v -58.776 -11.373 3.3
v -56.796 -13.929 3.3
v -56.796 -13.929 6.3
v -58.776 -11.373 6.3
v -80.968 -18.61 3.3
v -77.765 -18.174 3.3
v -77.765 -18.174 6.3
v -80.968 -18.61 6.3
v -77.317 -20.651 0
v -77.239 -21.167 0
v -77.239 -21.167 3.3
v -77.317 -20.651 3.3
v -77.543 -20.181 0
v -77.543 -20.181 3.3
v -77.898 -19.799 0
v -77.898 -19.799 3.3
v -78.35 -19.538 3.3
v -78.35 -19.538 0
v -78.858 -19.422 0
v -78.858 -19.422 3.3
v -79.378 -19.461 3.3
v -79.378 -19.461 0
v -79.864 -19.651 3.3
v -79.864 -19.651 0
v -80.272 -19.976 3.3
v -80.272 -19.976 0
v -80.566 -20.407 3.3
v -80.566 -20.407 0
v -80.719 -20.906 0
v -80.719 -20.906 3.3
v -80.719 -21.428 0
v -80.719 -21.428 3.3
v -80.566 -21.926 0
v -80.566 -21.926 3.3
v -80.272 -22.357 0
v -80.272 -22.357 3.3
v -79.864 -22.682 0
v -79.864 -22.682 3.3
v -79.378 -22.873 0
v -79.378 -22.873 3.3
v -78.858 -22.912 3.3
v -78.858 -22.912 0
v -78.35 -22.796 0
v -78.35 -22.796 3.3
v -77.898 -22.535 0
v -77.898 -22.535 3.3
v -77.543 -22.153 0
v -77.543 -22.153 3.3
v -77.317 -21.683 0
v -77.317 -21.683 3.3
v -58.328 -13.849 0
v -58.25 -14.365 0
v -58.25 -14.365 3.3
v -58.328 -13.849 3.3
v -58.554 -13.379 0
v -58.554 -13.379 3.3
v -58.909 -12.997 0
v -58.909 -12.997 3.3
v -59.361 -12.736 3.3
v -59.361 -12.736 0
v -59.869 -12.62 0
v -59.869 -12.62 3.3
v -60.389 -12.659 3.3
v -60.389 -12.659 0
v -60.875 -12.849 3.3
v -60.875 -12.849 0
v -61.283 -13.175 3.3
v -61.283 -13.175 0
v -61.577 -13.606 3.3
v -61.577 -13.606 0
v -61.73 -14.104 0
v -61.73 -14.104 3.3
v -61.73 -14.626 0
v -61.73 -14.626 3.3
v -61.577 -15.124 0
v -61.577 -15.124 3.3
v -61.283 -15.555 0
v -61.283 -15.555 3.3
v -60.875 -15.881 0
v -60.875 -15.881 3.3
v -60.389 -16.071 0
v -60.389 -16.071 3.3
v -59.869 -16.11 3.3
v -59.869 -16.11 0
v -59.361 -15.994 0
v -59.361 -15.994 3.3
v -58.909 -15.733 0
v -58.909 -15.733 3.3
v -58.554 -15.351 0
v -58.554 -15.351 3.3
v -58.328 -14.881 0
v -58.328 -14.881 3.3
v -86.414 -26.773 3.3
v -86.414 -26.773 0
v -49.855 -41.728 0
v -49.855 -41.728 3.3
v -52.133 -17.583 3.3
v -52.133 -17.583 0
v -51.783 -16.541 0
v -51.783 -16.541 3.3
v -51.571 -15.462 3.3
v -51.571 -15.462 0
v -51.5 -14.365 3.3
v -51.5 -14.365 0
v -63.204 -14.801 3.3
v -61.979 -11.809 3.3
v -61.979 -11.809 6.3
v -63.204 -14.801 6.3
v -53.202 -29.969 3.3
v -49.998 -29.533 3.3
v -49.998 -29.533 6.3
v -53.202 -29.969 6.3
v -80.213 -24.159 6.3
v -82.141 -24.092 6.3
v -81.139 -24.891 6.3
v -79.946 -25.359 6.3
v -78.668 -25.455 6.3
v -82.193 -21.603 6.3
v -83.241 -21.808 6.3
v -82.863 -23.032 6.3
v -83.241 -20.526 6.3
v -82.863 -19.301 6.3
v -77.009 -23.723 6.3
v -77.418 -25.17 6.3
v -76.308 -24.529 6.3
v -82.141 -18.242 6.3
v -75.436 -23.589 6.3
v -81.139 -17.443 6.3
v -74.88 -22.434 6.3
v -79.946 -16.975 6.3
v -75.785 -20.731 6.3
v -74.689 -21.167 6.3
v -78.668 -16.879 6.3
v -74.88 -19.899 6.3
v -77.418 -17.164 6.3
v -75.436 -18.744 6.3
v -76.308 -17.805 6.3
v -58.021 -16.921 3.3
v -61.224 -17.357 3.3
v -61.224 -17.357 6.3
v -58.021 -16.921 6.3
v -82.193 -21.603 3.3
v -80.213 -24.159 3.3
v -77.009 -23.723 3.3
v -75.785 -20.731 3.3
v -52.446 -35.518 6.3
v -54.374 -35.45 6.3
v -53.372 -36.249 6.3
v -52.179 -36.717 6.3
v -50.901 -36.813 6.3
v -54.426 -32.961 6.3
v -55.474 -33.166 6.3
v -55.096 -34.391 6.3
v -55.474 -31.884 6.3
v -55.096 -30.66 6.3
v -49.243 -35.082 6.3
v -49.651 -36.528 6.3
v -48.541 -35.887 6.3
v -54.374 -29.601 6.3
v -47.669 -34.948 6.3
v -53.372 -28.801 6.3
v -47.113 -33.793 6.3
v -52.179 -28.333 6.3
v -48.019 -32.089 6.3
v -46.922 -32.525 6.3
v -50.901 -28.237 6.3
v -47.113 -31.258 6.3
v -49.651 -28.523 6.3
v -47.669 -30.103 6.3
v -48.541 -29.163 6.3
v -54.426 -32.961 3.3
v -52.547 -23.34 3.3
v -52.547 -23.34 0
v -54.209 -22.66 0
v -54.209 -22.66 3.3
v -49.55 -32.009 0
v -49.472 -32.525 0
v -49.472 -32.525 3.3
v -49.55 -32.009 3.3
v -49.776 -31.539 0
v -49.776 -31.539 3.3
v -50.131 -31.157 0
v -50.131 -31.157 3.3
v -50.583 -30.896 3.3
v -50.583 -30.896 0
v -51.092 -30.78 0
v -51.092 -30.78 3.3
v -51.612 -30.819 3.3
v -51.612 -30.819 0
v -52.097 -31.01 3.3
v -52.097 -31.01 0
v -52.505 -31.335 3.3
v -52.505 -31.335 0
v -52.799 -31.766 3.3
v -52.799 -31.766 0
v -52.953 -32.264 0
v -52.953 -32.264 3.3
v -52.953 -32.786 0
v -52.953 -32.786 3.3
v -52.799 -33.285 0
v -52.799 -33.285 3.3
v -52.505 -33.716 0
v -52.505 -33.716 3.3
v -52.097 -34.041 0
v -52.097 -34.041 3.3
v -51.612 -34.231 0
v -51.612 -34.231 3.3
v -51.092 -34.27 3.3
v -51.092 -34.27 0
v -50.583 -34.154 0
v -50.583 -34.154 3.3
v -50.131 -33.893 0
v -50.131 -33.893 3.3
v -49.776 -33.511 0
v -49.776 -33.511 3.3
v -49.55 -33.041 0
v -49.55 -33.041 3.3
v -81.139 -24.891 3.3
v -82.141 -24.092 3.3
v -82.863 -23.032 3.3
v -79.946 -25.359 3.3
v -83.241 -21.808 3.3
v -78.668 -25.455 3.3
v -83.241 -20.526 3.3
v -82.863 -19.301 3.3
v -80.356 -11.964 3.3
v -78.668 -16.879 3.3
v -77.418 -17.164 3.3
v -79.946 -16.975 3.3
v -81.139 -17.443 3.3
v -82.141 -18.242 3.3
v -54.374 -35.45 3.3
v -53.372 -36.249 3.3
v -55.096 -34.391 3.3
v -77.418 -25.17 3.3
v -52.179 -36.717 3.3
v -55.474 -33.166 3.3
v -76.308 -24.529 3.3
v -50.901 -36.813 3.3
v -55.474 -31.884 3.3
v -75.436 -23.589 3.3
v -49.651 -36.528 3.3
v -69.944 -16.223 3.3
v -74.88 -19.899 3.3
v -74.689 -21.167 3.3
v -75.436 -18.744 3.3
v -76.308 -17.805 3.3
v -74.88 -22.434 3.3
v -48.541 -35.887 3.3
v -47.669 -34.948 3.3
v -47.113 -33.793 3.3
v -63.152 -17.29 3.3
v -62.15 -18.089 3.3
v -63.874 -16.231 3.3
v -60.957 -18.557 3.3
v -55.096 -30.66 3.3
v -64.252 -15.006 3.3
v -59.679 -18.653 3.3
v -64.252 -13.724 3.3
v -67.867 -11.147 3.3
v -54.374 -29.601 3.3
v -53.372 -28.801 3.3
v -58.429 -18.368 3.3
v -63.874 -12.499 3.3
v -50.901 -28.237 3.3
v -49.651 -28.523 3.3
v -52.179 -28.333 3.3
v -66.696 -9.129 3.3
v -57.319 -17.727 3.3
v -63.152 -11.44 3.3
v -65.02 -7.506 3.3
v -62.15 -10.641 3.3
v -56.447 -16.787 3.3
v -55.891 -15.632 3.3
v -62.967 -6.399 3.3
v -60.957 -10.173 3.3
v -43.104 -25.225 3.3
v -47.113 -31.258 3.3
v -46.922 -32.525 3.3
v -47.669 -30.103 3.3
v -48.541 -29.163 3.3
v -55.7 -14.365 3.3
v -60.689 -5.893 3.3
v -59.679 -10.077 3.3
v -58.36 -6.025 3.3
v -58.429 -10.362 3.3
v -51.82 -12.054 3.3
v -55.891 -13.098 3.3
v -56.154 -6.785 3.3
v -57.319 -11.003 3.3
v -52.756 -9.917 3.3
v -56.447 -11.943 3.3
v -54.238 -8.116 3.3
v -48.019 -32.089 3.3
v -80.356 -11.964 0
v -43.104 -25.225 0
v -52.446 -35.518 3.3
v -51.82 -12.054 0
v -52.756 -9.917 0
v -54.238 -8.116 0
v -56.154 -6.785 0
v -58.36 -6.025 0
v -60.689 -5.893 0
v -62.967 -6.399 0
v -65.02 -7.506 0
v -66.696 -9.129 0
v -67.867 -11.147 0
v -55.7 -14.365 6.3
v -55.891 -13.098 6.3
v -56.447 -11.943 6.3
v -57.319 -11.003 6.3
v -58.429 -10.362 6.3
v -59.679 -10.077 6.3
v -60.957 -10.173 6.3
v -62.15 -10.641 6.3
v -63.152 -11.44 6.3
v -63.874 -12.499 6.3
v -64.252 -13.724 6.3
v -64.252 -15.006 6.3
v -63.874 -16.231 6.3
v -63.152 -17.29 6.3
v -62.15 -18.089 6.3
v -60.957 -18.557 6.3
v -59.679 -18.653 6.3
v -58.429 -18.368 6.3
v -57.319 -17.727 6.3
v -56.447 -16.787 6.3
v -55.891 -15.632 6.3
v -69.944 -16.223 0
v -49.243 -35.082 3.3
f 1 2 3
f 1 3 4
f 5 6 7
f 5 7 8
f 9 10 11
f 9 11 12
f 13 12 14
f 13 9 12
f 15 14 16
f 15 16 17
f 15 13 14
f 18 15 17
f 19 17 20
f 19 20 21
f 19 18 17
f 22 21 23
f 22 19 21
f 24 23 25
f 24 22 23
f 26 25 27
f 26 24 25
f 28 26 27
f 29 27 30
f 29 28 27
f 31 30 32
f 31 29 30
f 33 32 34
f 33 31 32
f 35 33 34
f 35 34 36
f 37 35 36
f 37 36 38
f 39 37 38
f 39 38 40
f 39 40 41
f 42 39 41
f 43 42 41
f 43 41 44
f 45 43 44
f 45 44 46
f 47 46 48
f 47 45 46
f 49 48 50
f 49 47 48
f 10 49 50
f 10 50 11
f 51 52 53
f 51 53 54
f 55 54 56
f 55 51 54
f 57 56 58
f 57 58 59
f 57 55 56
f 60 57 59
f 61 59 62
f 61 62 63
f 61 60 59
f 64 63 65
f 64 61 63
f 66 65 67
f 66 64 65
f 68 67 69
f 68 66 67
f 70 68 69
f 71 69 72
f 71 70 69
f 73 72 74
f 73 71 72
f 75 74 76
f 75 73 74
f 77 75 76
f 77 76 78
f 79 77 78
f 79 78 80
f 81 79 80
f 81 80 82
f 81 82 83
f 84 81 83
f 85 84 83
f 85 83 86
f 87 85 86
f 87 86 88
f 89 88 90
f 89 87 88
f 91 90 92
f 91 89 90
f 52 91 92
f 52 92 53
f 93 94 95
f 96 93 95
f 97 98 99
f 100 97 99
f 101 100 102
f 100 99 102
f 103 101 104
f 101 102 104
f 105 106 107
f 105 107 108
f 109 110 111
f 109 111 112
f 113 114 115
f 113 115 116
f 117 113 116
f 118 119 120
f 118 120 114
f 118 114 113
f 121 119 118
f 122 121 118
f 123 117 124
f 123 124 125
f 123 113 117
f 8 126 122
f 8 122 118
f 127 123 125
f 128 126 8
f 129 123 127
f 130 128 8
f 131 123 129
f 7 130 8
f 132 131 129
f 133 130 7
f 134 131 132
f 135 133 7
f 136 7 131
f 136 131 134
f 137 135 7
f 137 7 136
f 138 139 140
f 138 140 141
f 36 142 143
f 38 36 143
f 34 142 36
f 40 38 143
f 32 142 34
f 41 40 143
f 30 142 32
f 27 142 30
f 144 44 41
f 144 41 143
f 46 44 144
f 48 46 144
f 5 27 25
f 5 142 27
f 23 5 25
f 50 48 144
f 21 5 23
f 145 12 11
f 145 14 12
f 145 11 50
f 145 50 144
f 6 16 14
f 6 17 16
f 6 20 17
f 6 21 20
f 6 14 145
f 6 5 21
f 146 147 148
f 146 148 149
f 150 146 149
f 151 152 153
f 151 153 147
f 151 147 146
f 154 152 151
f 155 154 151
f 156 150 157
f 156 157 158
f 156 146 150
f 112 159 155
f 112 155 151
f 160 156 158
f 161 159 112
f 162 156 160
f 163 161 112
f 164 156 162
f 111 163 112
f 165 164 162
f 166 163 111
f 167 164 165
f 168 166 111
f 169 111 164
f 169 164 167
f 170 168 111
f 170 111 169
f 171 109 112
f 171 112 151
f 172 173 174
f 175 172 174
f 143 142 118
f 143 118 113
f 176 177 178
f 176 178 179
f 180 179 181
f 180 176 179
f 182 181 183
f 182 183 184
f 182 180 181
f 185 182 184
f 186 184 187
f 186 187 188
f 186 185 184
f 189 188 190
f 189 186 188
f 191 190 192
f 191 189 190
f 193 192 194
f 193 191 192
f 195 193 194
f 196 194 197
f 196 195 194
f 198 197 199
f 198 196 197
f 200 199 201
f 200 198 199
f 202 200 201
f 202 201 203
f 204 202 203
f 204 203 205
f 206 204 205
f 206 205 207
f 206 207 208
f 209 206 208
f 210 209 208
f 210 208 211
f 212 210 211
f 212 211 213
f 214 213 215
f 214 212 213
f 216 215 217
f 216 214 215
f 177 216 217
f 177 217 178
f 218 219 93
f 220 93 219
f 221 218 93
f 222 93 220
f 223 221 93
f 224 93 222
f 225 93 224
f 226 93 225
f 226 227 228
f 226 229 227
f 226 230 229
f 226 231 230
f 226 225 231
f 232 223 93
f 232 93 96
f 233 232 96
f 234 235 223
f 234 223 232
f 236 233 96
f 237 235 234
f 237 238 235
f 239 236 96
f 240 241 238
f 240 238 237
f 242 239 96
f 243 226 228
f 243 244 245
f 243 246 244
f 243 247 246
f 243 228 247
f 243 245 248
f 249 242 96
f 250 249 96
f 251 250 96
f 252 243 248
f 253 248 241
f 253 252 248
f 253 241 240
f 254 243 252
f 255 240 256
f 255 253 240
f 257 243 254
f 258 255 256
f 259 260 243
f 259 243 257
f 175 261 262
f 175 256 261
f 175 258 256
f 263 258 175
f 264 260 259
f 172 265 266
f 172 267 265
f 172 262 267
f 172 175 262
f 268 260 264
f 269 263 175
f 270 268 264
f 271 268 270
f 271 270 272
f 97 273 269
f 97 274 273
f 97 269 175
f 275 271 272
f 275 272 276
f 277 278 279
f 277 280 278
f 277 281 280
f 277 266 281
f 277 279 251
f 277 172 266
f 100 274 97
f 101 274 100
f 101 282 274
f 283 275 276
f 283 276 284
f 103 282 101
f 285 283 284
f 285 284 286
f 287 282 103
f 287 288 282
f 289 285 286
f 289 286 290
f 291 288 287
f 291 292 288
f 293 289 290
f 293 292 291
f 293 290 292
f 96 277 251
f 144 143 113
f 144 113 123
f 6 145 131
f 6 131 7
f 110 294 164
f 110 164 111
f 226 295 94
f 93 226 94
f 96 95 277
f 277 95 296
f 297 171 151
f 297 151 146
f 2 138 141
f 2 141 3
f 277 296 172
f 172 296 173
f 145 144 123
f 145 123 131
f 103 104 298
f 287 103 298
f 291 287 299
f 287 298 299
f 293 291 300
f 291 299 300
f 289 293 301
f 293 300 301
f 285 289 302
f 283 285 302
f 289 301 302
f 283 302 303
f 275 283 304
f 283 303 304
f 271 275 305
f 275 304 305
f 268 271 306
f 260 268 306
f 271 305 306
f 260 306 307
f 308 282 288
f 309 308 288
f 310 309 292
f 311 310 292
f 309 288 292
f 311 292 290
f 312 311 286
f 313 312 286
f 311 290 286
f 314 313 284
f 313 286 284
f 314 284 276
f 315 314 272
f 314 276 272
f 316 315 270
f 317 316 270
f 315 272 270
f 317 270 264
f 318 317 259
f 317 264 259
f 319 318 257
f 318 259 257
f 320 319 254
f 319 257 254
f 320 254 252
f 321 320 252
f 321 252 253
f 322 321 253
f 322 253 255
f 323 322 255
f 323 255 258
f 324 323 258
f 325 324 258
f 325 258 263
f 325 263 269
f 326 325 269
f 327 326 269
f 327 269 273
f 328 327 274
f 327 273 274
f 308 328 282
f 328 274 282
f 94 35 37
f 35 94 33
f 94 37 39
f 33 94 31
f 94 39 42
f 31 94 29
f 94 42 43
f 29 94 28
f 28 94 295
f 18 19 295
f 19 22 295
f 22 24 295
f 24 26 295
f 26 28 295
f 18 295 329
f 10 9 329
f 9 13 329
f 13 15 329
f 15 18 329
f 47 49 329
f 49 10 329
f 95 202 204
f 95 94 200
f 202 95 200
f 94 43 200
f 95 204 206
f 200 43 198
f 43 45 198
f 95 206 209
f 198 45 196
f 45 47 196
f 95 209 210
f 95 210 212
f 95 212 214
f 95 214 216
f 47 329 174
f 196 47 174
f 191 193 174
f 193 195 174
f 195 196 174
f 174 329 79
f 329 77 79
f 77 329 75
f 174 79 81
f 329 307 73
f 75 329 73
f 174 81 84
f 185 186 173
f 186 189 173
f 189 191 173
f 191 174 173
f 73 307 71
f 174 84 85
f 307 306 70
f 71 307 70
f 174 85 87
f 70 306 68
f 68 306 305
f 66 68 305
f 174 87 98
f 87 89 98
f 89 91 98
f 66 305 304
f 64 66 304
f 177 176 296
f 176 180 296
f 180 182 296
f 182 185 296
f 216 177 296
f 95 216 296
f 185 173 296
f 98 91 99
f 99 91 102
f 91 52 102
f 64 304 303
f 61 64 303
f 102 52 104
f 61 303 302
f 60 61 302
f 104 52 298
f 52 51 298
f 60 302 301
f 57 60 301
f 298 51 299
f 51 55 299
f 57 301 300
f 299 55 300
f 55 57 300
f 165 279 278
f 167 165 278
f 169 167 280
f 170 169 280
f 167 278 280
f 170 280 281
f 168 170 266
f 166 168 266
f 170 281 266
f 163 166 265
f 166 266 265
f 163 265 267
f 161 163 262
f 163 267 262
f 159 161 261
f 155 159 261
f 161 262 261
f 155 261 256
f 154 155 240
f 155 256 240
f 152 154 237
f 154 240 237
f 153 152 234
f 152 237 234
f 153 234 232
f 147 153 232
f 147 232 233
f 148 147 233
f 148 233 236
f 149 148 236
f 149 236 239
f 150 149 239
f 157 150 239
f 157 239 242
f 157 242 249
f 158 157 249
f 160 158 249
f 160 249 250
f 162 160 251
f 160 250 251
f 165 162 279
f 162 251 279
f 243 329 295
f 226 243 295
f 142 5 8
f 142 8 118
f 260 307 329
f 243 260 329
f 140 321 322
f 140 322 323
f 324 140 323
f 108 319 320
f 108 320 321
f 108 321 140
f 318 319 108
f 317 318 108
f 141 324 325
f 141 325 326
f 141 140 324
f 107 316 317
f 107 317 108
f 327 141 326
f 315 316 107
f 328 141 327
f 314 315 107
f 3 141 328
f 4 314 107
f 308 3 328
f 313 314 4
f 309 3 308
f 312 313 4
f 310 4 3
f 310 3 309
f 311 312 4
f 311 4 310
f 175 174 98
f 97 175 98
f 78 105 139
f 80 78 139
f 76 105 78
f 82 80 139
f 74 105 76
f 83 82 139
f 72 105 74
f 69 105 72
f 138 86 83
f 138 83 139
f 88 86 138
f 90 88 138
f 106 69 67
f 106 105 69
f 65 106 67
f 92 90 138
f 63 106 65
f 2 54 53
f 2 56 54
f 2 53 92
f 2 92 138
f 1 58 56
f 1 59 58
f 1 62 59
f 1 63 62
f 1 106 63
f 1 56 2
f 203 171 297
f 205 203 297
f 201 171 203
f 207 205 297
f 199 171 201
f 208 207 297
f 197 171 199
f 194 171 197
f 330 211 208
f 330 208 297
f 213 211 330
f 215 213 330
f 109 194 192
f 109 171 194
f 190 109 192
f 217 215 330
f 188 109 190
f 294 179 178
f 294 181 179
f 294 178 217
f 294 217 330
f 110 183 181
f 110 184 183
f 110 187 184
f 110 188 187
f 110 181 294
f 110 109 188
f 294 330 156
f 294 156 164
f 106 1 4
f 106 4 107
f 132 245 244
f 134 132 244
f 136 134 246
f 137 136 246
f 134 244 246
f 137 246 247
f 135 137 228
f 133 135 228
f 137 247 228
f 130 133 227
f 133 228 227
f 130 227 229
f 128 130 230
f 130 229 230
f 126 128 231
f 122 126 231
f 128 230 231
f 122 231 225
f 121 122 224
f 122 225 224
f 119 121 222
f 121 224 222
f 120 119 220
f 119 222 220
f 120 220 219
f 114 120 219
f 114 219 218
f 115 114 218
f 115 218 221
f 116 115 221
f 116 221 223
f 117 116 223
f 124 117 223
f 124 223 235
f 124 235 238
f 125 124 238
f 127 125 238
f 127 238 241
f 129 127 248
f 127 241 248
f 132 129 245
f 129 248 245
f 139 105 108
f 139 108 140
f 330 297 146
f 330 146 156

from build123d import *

# Parameters (mm, degrees)
SKETCH1_R           = 1.75
BOSS_EXTRUDE1_DEPTH = 3.3
SKETCH3_R           = 4.3
BOSS_EXTRUDE3_DEPTH = 3


with BuildPart() as part:
    # Sketch1 → Boss-Extrude1 (new body)
    with BuildSketch(Plane.XY):
        with BuildLine():
            ThreePointArc((-51.5, -14.365), (-58.360069791, -6.024698512), (-67.867206803, -11.146761798))
            ThreePointArc((-67.867206803, -11.146761798), (-68.49399131, -14.045450902), (-68.08677112, -16.983039888))
            ThreePointArc((-68.08677112, -16.983039888), (-63.218238202, -22.232206803), (-56.066588393, -21.900135907))
            ThreePointArc((-56.066588393, -21.900135907), (-53.717281627, -20.090159373), (-52.132793197, -17.583238202))
            ThreePointArc((-52.132793197, -17.583238202), (-51.659698512, -16.004930209), (-51.5, -14.365))
        make_face()
        with Locations((-60, -14.365)):
            Circle(SKETCH1_R, mode=Mode.SUBTRACT)
        with BuildLine():
            ThreePointArc((-68.08677112, -16.983039888), (-68.49399131, -14.045450902), (-67.867206803, -11.146761798))
            Line((-67.867206803, -11.146761798), (-69.943886559, -16.223349695))
            Line((-69.943886559, -16.223349695), (-68.08677112, -16.983039888))
        make_face()
        with BuildLine():
            Line((-68.08677112, -16.983039888), (-69.943886559, -16.223349695))
            Line((-69.943886559, -16.223349695), (-80.356366151, -11.963916781))
            Line((-80.356366151, -11.963916781), (-86.414226296, -26.772776645))
            Line((-86.414226296, -26.772776645), (-49.854853507, -41.728118878))
            Line((-49.854853507, -41.728118878), (-43.103796568, -25.224691306))
            Line((-43.103796568, -25.224691306), (-52.547252782, -23.339790487))
            Line((-52.547252782, -23.339790487), (-54.209472954, -22.659826099))
            Line((-54.209472954, -22.659826099), (-56.066588393, -21.900135907))
            ThreePointArc((-56.066588393, -21.900135907), (-63.218238202, -22.232206803), (-68.08677112, -16.983039888))
        make_face()
        with Locations((-51.222303707, -32.525261715)):
            Circle(SKETCH1_R, mode=Mode.SUBTRACT)
        with Locations((-78.988915951, -21.166773943)):
            Circle(SKETCH1_R, mode=Mode.SUBTRACT)
        with BuildLine():
            Line((-54.209472954, -22.659826099), (-52.132793197, -17.583238202))
            ThreePointArc((-52.132793197, -17.583238202), (-53.717281627, -20.090159373), (-56.066588393, -21.900135907))
            Line((-56.066588393, -21.900135907), (-54.209472954, -22.659826099))
        make_face()
    extrude(amount=BOSS_EXTRUDE1_DEPTH)

    # Sketch3 → Boss-Extrude3 (add)
    with BuildSketch(Plane.XY.offset(3.3)):
        with Locations((-78.988915951, -21.166773943)):
            Circle(SKETCH3_R)
        Polygon((-75.785301718, -20.730667104), (-77.764788436, -18.174309213), (-80.96840267, -18.610416053), (-82.192530185, -21.602880783), (-80.213043466, -24.159238673), (-77.009429233, -23.723131834), align=None, mode=Mode.SUBTRACT)
        with Locations((-60, -14.365)):
            Circle(SKETCH3_R)
        Polygon((-63.203614234, -14.80110684), (-61.224127515, -17.35746473), (-58.020513281, -16.92135789), (-56.796385766, -13.92889316), (-58.775872485, -11.37253527), (-61.979486719, -11.80864211), align=None, mode=Mode.SUBTRACT)
        with Locations((-51.222303707, -32.525261715)):
            Circle(SKETCH3_R)
        Polygon((-54.42591794, -32.961368555), (-52.446431222, -35.517726445), (-49.242816988, -35.081619606), (-48.018689473, -32.089154876), (-49.998176192, -29.532796985), (-53.201790425, -29.968903825), align=None, mode=Mode.SUBTRACT)
    extrude(amount=BOSS_EXTRUDE3_DEPTH)


solid = part.part
